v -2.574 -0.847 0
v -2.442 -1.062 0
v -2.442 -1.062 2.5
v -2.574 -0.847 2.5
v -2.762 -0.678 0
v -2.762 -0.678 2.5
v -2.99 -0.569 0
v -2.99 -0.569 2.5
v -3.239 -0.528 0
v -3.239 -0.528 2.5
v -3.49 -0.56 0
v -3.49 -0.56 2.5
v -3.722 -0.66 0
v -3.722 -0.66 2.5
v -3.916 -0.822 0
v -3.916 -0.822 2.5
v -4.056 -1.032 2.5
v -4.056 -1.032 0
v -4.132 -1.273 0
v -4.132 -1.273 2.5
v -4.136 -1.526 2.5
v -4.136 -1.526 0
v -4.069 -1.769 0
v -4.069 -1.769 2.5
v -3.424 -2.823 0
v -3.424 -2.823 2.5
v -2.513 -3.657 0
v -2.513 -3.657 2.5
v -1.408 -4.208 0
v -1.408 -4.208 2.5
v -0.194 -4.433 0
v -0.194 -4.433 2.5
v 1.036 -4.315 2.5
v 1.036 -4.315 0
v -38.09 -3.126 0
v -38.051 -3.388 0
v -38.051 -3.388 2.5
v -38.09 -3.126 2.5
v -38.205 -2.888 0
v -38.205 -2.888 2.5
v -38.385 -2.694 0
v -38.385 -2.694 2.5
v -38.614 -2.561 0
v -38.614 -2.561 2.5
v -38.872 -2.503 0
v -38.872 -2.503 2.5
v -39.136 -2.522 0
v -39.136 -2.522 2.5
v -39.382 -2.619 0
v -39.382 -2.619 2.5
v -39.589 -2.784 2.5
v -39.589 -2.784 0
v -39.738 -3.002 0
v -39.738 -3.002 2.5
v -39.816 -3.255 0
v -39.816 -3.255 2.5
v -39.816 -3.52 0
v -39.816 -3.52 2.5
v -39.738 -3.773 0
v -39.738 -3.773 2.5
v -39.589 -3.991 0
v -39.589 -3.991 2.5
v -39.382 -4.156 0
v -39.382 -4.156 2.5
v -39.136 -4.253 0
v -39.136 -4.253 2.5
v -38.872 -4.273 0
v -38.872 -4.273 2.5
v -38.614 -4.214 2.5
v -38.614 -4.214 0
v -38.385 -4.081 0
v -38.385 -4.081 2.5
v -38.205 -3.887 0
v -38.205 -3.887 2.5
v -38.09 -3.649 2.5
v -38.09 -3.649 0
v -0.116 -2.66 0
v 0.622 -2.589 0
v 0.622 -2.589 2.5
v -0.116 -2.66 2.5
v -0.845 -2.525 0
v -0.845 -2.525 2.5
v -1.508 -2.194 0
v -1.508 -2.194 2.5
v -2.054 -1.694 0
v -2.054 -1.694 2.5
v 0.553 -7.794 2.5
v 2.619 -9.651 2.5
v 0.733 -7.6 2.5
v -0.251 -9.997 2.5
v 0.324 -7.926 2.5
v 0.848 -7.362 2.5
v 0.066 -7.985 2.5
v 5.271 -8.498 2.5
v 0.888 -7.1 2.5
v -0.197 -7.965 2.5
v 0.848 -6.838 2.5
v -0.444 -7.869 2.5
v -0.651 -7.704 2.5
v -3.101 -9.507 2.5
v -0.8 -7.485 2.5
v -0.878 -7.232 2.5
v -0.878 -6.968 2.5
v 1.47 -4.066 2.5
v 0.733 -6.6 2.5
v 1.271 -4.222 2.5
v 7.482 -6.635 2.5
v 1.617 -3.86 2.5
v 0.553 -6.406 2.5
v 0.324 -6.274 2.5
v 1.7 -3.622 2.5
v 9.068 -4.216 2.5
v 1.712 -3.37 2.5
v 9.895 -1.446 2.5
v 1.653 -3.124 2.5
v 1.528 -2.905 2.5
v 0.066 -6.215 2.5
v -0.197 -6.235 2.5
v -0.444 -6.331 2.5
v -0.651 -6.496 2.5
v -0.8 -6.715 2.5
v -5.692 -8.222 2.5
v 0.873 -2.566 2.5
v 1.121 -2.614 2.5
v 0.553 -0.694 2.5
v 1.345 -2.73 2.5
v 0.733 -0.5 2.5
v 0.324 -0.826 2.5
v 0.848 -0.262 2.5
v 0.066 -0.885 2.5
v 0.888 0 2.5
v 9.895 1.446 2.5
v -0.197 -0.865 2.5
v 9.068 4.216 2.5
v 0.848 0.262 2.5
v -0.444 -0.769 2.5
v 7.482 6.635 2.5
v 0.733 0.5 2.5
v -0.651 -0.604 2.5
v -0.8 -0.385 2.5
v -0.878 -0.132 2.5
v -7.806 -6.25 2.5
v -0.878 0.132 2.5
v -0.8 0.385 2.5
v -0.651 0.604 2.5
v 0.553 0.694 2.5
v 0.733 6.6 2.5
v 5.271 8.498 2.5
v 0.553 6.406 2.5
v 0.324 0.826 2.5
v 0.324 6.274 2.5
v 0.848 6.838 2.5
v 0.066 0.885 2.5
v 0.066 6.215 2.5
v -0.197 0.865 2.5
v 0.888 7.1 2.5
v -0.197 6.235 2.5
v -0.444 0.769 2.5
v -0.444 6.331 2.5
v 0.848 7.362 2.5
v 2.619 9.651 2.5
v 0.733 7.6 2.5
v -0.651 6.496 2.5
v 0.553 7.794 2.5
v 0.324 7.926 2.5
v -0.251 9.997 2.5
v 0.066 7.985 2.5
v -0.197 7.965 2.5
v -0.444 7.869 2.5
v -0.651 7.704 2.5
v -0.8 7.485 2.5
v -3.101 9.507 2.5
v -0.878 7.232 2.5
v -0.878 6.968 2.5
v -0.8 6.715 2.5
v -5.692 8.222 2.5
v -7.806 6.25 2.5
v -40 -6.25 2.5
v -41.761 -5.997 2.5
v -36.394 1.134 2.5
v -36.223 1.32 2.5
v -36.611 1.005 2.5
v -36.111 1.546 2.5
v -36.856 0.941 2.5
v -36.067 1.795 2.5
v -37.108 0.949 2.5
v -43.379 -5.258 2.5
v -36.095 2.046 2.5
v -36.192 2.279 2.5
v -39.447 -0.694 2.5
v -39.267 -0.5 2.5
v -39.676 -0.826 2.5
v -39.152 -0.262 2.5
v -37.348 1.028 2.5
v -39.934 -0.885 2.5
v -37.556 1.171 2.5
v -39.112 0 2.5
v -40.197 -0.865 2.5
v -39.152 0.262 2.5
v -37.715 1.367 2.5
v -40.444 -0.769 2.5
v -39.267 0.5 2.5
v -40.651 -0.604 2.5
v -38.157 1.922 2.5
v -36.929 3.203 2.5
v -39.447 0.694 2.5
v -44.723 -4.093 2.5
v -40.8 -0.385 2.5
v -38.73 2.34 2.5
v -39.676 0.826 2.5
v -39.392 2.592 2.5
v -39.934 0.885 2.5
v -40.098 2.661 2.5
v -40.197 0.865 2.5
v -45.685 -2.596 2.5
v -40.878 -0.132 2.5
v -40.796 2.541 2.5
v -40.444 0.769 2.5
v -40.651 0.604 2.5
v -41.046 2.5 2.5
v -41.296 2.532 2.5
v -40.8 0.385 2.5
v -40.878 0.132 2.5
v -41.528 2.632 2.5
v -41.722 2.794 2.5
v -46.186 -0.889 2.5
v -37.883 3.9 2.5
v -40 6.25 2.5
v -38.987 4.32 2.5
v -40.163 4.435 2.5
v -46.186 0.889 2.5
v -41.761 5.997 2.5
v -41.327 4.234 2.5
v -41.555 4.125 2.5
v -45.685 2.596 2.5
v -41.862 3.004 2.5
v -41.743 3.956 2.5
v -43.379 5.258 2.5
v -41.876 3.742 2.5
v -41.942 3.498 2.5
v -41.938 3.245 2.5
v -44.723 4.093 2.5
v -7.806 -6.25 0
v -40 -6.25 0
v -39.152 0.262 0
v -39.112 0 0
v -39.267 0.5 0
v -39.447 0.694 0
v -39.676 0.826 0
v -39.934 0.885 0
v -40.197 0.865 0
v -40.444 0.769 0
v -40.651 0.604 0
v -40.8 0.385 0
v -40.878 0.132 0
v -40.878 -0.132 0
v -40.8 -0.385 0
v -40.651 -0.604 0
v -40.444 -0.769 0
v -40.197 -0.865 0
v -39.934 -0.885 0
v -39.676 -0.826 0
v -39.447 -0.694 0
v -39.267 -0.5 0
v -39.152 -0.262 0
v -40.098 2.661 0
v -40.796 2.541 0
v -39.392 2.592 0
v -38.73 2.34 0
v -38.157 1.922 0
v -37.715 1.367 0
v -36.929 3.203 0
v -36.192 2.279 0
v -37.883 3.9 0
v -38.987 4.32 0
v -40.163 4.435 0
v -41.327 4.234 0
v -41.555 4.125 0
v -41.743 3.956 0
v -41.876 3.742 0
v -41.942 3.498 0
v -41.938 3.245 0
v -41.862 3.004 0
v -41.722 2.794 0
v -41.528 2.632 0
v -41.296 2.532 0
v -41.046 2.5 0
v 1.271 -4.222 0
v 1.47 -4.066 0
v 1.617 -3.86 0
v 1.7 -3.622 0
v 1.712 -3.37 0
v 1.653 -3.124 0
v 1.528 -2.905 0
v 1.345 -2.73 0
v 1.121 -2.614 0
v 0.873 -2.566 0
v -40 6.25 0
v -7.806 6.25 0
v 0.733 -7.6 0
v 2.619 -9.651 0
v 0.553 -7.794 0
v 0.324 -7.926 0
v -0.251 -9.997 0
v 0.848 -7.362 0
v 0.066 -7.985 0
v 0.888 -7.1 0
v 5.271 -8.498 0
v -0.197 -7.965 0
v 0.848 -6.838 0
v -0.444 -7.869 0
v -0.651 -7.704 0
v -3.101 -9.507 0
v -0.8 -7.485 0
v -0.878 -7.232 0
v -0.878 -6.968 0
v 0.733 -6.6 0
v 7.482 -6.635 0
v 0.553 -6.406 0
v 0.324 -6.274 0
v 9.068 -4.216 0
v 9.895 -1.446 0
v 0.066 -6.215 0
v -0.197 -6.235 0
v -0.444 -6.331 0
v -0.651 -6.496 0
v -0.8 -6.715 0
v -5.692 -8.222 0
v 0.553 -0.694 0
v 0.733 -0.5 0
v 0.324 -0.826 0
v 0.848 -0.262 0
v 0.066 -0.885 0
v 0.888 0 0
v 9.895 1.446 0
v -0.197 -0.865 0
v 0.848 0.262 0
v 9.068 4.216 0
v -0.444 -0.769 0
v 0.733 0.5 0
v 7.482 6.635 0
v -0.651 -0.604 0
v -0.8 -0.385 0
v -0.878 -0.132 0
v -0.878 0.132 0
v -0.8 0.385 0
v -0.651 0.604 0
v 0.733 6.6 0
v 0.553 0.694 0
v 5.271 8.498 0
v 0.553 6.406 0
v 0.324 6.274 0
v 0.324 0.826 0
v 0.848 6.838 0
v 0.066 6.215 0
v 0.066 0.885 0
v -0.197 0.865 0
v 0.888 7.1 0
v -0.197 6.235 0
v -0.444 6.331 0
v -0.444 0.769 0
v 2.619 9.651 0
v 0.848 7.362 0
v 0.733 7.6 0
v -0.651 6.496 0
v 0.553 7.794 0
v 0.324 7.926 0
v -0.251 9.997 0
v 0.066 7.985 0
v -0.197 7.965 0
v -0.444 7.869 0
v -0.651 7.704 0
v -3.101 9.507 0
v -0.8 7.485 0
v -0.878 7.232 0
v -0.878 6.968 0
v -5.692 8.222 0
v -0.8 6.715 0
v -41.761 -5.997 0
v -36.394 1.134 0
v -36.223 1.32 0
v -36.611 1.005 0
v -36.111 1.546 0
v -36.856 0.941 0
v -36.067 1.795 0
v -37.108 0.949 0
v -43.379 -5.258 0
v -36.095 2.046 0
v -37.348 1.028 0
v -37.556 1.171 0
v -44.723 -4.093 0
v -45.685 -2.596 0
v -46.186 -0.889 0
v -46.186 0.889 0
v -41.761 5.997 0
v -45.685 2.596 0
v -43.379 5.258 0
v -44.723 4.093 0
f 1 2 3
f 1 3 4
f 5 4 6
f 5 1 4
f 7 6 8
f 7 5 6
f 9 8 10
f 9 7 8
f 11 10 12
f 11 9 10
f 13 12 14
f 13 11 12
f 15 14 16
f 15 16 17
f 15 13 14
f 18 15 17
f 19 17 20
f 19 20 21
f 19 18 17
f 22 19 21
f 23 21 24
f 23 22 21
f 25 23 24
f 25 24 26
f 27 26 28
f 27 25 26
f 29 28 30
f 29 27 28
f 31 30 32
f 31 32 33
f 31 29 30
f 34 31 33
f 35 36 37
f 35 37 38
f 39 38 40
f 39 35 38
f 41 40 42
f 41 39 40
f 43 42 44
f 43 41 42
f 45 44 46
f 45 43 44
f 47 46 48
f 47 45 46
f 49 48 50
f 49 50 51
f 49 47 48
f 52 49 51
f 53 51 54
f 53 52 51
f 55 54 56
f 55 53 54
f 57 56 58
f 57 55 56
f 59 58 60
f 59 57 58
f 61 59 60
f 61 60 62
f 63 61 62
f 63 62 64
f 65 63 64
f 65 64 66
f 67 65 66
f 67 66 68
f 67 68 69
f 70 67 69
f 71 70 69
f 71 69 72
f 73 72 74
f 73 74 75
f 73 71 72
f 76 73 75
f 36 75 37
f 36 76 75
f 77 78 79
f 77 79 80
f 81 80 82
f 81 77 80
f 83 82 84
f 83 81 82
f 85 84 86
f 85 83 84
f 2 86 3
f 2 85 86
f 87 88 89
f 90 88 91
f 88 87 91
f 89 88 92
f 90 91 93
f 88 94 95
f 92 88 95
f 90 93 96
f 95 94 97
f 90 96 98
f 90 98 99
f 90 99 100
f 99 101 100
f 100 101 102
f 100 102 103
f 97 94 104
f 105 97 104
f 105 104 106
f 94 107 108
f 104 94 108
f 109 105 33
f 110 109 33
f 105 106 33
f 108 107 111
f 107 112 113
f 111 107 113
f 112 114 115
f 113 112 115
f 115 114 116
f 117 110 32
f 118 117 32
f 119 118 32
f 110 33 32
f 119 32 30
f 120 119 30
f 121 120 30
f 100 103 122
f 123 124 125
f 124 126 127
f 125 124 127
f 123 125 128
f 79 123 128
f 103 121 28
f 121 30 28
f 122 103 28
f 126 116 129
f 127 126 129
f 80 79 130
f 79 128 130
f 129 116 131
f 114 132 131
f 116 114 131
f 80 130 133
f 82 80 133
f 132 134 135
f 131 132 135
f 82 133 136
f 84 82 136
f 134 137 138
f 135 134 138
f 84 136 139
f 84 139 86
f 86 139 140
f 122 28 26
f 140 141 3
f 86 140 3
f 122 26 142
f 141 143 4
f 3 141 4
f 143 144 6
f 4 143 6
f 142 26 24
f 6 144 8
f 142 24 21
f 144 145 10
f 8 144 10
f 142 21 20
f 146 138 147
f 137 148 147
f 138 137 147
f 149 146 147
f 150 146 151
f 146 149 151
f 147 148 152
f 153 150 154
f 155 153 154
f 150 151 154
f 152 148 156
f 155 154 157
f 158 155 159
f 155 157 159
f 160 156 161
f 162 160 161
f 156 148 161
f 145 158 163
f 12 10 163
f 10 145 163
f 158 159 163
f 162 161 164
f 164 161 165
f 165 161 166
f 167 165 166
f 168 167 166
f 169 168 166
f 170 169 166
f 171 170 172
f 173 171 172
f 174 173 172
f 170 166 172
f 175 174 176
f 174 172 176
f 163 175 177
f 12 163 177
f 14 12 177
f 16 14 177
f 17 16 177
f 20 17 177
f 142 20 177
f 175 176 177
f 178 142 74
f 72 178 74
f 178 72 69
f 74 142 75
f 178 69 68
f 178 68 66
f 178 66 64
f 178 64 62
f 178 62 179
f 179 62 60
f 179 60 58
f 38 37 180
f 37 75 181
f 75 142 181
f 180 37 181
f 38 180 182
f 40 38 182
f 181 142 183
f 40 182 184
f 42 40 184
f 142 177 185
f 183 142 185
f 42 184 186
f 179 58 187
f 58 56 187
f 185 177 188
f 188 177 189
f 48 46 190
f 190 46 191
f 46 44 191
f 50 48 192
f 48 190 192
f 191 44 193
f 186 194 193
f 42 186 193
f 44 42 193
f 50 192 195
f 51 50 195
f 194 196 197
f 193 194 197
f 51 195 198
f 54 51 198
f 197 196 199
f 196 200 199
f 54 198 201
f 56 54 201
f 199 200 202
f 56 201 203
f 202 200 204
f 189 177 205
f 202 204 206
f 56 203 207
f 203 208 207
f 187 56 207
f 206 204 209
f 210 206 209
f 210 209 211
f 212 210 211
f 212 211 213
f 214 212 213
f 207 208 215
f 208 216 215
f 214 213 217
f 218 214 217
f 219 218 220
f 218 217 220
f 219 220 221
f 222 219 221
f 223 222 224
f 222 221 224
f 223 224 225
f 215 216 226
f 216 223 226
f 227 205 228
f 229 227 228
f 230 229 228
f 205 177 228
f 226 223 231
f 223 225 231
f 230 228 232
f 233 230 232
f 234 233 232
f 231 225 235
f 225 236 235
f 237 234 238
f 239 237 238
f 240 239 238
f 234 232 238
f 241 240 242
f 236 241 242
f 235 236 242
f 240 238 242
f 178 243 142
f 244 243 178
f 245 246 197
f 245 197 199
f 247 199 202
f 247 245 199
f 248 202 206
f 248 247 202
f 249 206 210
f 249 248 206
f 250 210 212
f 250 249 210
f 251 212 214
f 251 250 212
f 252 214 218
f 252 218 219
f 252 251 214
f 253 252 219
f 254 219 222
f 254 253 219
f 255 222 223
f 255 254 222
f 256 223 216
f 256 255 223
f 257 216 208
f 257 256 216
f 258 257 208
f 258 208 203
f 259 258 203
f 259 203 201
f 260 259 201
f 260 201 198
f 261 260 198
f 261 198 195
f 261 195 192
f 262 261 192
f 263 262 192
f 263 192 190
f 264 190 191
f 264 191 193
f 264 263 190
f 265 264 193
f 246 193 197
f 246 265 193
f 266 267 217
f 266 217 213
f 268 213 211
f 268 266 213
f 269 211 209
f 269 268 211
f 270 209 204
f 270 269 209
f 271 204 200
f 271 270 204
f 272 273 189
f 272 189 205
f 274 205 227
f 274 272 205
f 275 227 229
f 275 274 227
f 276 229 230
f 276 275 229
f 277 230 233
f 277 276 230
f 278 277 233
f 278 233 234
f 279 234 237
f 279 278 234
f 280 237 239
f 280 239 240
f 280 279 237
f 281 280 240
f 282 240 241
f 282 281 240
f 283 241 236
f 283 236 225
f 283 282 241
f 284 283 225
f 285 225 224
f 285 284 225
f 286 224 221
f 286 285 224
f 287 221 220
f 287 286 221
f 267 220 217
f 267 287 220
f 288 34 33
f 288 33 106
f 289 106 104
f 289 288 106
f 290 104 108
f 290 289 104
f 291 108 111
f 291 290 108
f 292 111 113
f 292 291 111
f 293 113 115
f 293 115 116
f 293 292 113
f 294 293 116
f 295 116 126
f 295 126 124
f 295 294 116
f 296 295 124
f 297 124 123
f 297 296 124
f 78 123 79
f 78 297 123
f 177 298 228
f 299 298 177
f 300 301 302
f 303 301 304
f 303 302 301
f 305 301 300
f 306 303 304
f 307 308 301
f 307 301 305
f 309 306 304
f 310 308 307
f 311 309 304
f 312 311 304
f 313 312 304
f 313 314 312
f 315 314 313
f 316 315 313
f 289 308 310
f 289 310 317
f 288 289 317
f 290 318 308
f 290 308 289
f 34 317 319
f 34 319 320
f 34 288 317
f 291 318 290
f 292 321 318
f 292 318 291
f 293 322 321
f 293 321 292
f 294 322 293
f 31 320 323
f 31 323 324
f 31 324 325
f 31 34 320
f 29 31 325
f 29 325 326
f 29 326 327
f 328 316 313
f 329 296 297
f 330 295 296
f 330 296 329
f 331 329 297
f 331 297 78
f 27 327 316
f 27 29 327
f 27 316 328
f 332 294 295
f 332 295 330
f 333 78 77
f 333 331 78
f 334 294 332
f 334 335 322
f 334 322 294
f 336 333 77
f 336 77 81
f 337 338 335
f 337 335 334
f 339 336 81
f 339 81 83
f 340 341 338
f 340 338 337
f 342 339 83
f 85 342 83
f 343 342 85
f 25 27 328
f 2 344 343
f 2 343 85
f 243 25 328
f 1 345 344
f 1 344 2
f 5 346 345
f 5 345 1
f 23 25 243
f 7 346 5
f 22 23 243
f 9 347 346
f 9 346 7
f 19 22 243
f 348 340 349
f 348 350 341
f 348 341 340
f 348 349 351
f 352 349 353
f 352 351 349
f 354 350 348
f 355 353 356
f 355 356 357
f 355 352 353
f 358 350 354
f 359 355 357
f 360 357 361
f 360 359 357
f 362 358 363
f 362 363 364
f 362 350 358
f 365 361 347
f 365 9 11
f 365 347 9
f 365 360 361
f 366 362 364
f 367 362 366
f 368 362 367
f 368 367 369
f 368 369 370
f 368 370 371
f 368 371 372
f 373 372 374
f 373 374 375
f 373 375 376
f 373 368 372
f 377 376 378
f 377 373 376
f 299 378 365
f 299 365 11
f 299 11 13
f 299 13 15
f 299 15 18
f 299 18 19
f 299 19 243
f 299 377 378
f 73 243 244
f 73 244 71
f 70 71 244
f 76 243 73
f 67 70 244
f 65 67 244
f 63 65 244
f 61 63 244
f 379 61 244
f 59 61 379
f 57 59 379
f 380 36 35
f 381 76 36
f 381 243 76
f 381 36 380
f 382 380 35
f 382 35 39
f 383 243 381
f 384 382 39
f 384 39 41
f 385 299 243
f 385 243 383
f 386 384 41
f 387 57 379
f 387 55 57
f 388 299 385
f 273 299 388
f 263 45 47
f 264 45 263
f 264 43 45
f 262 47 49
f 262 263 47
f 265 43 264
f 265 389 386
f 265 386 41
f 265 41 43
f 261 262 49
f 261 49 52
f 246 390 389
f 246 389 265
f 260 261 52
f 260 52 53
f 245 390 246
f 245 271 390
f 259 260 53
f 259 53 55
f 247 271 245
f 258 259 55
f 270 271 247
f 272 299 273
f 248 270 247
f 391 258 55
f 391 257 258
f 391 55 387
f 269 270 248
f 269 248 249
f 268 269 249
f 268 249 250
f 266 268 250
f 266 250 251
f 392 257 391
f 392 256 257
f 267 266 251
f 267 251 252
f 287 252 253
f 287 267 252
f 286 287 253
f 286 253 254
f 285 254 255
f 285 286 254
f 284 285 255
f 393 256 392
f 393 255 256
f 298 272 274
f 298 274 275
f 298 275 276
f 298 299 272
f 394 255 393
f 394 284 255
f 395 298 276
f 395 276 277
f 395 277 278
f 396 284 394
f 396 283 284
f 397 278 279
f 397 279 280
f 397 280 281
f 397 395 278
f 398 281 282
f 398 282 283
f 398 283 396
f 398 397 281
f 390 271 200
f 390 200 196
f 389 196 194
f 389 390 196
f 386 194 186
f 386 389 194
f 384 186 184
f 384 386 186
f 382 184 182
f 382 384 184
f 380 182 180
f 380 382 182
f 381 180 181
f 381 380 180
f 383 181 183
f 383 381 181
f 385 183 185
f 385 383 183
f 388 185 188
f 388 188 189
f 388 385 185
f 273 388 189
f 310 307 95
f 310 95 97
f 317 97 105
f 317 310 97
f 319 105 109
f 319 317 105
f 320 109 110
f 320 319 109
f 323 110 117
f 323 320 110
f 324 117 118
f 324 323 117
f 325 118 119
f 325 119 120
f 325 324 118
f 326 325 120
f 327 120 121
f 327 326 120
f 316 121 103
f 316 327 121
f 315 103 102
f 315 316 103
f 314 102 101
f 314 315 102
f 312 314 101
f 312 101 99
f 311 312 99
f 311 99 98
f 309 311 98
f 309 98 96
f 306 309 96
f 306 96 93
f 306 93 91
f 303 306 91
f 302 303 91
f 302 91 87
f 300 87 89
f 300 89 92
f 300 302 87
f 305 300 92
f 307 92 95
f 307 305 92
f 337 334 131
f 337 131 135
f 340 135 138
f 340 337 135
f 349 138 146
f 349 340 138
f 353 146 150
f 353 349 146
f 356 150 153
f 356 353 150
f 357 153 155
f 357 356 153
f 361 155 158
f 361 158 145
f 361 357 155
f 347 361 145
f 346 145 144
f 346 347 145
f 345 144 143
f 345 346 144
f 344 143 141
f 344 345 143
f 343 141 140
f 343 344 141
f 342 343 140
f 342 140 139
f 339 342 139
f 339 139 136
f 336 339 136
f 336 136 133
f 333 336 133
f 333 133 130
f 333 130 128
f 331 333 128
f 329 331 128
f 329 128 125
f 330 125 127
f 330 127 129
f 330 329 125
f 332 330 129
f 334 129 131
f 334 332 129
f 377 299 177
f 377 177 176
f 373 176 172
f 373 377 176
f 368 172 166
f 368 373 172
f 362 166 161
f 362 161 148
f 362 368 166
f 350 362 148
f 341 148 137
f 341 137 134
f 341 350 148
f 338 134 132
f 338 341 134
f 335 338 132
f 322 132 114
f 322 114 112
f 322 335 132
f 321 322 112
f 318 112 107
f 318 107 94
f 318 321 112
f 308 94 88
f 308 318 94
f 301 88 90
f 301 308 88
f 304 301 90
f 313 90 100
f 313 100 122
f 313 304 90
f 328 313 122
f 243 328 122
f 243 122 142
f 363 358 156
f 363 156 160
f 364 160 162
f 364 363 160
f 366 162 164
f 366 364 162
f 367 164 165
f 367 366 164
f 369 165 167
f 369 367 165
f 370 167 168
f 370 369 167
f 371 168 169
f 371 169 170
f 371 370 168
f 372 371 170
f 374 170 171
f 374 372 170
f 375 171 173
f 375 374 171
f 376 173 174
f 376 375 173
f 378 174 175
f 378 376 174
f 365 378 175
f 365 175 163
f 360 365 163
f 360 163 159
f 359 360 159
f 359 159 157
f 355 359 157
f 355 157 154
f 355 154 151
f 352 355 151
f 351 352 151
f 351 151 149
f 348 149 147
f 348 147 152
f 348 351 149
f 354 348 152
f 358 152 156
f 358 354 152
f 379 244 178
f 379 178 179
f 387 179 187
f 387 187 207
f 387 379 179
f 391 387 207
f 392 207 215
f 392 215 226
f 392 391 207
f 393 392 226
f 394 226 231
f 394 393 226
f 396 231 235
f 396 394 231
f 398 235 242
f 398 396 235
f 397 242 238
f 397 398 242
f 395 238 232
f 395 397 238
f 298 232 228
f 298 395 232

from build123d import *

# Parameters (mm, degrees)
SKETCH1_R           = 0.8875
BOSS_EXTRUDE1_DEPTH = 2.5


with BuildPart() as part:
    # Sketch1 → Boss-Extrude1 (new body)
    with BuildSketch(Plane.XY):
        with BuildLine():
            Line((-40, 6.25), (-7.806247498, 6.25))
            ThreePointArc((-7.806247498, 6.25), (10, 0), (-7.806247498, -6.25))
            Line((-7.806247498, -6.25), (-40, -6.25))
            ThreePointArc((-40, -6.25), (-46.25, 0), (-40, 6.25))
        make_face()
        Circle(SKETCH1_R, mode=Mode.SUBTRACT)
        with Locations((-40, 0)):
            Circle(SKETCH1_R, mode=Mode.SUBTRACT)
        with Locations((0, 7.1)):
            Circle(SKETCH1_R, mode=Mode.SUBTRACT)
        with Locations((0, -7.1)):
            Circle(SKETCH1_R, mode=Mode.SUBTRACT)
        with Locations((-38.938319925, -3.387526445)):
            Circle(SKETCH1_R, mode=Mode.SUBTRACT)
        with BuildLine():
            ThreePointArc((-36.192394339, 2.278935142), (-38.420697766, 4.146951977), (-41.327100094, 4.234408057))
            ThreePointArc((-41.327100094, 4.234408057), (-41.908561687, 3.122106427), (-40.796260056, 2.540644834))
            ThreePointArc((-40.796260056, 2.540644834), (-39.05241866, 2.488171186), (-37.715436604, 1.367361085))
            ThreePointArc((-37.715436604, 1.367361085), (-36.498128443, 1.061626982), (-36.192394339, 2.278935142))
        make_face(mode=Mode.SUBTRACT)
        with BuildLine():
            ThreePointArc((-4.06945408, -1.769448993), (-1.980002796, -3.97127123), (1.035913802, -4.314891522))
            ThreePointArc((1.035913802, -4.314891522), (1.691709346, -3.244730457), (0.621548281, -2.588934913))
            ThreePointArc((0.621548281, -2.588934913), (-1.188001677, -2.382762738), (-2.441672448, -1.061669396))
            ThreePointArc((-2.441672448, -1.061669396), (-3.609453063, -0.601668379), (-4.06945408, -1.769448993))
        make_face(mode=Mode.SUBTRACT)
    extrude(amount=BOSS_EXTRUDE1_DEPTH)


solid = part.part
